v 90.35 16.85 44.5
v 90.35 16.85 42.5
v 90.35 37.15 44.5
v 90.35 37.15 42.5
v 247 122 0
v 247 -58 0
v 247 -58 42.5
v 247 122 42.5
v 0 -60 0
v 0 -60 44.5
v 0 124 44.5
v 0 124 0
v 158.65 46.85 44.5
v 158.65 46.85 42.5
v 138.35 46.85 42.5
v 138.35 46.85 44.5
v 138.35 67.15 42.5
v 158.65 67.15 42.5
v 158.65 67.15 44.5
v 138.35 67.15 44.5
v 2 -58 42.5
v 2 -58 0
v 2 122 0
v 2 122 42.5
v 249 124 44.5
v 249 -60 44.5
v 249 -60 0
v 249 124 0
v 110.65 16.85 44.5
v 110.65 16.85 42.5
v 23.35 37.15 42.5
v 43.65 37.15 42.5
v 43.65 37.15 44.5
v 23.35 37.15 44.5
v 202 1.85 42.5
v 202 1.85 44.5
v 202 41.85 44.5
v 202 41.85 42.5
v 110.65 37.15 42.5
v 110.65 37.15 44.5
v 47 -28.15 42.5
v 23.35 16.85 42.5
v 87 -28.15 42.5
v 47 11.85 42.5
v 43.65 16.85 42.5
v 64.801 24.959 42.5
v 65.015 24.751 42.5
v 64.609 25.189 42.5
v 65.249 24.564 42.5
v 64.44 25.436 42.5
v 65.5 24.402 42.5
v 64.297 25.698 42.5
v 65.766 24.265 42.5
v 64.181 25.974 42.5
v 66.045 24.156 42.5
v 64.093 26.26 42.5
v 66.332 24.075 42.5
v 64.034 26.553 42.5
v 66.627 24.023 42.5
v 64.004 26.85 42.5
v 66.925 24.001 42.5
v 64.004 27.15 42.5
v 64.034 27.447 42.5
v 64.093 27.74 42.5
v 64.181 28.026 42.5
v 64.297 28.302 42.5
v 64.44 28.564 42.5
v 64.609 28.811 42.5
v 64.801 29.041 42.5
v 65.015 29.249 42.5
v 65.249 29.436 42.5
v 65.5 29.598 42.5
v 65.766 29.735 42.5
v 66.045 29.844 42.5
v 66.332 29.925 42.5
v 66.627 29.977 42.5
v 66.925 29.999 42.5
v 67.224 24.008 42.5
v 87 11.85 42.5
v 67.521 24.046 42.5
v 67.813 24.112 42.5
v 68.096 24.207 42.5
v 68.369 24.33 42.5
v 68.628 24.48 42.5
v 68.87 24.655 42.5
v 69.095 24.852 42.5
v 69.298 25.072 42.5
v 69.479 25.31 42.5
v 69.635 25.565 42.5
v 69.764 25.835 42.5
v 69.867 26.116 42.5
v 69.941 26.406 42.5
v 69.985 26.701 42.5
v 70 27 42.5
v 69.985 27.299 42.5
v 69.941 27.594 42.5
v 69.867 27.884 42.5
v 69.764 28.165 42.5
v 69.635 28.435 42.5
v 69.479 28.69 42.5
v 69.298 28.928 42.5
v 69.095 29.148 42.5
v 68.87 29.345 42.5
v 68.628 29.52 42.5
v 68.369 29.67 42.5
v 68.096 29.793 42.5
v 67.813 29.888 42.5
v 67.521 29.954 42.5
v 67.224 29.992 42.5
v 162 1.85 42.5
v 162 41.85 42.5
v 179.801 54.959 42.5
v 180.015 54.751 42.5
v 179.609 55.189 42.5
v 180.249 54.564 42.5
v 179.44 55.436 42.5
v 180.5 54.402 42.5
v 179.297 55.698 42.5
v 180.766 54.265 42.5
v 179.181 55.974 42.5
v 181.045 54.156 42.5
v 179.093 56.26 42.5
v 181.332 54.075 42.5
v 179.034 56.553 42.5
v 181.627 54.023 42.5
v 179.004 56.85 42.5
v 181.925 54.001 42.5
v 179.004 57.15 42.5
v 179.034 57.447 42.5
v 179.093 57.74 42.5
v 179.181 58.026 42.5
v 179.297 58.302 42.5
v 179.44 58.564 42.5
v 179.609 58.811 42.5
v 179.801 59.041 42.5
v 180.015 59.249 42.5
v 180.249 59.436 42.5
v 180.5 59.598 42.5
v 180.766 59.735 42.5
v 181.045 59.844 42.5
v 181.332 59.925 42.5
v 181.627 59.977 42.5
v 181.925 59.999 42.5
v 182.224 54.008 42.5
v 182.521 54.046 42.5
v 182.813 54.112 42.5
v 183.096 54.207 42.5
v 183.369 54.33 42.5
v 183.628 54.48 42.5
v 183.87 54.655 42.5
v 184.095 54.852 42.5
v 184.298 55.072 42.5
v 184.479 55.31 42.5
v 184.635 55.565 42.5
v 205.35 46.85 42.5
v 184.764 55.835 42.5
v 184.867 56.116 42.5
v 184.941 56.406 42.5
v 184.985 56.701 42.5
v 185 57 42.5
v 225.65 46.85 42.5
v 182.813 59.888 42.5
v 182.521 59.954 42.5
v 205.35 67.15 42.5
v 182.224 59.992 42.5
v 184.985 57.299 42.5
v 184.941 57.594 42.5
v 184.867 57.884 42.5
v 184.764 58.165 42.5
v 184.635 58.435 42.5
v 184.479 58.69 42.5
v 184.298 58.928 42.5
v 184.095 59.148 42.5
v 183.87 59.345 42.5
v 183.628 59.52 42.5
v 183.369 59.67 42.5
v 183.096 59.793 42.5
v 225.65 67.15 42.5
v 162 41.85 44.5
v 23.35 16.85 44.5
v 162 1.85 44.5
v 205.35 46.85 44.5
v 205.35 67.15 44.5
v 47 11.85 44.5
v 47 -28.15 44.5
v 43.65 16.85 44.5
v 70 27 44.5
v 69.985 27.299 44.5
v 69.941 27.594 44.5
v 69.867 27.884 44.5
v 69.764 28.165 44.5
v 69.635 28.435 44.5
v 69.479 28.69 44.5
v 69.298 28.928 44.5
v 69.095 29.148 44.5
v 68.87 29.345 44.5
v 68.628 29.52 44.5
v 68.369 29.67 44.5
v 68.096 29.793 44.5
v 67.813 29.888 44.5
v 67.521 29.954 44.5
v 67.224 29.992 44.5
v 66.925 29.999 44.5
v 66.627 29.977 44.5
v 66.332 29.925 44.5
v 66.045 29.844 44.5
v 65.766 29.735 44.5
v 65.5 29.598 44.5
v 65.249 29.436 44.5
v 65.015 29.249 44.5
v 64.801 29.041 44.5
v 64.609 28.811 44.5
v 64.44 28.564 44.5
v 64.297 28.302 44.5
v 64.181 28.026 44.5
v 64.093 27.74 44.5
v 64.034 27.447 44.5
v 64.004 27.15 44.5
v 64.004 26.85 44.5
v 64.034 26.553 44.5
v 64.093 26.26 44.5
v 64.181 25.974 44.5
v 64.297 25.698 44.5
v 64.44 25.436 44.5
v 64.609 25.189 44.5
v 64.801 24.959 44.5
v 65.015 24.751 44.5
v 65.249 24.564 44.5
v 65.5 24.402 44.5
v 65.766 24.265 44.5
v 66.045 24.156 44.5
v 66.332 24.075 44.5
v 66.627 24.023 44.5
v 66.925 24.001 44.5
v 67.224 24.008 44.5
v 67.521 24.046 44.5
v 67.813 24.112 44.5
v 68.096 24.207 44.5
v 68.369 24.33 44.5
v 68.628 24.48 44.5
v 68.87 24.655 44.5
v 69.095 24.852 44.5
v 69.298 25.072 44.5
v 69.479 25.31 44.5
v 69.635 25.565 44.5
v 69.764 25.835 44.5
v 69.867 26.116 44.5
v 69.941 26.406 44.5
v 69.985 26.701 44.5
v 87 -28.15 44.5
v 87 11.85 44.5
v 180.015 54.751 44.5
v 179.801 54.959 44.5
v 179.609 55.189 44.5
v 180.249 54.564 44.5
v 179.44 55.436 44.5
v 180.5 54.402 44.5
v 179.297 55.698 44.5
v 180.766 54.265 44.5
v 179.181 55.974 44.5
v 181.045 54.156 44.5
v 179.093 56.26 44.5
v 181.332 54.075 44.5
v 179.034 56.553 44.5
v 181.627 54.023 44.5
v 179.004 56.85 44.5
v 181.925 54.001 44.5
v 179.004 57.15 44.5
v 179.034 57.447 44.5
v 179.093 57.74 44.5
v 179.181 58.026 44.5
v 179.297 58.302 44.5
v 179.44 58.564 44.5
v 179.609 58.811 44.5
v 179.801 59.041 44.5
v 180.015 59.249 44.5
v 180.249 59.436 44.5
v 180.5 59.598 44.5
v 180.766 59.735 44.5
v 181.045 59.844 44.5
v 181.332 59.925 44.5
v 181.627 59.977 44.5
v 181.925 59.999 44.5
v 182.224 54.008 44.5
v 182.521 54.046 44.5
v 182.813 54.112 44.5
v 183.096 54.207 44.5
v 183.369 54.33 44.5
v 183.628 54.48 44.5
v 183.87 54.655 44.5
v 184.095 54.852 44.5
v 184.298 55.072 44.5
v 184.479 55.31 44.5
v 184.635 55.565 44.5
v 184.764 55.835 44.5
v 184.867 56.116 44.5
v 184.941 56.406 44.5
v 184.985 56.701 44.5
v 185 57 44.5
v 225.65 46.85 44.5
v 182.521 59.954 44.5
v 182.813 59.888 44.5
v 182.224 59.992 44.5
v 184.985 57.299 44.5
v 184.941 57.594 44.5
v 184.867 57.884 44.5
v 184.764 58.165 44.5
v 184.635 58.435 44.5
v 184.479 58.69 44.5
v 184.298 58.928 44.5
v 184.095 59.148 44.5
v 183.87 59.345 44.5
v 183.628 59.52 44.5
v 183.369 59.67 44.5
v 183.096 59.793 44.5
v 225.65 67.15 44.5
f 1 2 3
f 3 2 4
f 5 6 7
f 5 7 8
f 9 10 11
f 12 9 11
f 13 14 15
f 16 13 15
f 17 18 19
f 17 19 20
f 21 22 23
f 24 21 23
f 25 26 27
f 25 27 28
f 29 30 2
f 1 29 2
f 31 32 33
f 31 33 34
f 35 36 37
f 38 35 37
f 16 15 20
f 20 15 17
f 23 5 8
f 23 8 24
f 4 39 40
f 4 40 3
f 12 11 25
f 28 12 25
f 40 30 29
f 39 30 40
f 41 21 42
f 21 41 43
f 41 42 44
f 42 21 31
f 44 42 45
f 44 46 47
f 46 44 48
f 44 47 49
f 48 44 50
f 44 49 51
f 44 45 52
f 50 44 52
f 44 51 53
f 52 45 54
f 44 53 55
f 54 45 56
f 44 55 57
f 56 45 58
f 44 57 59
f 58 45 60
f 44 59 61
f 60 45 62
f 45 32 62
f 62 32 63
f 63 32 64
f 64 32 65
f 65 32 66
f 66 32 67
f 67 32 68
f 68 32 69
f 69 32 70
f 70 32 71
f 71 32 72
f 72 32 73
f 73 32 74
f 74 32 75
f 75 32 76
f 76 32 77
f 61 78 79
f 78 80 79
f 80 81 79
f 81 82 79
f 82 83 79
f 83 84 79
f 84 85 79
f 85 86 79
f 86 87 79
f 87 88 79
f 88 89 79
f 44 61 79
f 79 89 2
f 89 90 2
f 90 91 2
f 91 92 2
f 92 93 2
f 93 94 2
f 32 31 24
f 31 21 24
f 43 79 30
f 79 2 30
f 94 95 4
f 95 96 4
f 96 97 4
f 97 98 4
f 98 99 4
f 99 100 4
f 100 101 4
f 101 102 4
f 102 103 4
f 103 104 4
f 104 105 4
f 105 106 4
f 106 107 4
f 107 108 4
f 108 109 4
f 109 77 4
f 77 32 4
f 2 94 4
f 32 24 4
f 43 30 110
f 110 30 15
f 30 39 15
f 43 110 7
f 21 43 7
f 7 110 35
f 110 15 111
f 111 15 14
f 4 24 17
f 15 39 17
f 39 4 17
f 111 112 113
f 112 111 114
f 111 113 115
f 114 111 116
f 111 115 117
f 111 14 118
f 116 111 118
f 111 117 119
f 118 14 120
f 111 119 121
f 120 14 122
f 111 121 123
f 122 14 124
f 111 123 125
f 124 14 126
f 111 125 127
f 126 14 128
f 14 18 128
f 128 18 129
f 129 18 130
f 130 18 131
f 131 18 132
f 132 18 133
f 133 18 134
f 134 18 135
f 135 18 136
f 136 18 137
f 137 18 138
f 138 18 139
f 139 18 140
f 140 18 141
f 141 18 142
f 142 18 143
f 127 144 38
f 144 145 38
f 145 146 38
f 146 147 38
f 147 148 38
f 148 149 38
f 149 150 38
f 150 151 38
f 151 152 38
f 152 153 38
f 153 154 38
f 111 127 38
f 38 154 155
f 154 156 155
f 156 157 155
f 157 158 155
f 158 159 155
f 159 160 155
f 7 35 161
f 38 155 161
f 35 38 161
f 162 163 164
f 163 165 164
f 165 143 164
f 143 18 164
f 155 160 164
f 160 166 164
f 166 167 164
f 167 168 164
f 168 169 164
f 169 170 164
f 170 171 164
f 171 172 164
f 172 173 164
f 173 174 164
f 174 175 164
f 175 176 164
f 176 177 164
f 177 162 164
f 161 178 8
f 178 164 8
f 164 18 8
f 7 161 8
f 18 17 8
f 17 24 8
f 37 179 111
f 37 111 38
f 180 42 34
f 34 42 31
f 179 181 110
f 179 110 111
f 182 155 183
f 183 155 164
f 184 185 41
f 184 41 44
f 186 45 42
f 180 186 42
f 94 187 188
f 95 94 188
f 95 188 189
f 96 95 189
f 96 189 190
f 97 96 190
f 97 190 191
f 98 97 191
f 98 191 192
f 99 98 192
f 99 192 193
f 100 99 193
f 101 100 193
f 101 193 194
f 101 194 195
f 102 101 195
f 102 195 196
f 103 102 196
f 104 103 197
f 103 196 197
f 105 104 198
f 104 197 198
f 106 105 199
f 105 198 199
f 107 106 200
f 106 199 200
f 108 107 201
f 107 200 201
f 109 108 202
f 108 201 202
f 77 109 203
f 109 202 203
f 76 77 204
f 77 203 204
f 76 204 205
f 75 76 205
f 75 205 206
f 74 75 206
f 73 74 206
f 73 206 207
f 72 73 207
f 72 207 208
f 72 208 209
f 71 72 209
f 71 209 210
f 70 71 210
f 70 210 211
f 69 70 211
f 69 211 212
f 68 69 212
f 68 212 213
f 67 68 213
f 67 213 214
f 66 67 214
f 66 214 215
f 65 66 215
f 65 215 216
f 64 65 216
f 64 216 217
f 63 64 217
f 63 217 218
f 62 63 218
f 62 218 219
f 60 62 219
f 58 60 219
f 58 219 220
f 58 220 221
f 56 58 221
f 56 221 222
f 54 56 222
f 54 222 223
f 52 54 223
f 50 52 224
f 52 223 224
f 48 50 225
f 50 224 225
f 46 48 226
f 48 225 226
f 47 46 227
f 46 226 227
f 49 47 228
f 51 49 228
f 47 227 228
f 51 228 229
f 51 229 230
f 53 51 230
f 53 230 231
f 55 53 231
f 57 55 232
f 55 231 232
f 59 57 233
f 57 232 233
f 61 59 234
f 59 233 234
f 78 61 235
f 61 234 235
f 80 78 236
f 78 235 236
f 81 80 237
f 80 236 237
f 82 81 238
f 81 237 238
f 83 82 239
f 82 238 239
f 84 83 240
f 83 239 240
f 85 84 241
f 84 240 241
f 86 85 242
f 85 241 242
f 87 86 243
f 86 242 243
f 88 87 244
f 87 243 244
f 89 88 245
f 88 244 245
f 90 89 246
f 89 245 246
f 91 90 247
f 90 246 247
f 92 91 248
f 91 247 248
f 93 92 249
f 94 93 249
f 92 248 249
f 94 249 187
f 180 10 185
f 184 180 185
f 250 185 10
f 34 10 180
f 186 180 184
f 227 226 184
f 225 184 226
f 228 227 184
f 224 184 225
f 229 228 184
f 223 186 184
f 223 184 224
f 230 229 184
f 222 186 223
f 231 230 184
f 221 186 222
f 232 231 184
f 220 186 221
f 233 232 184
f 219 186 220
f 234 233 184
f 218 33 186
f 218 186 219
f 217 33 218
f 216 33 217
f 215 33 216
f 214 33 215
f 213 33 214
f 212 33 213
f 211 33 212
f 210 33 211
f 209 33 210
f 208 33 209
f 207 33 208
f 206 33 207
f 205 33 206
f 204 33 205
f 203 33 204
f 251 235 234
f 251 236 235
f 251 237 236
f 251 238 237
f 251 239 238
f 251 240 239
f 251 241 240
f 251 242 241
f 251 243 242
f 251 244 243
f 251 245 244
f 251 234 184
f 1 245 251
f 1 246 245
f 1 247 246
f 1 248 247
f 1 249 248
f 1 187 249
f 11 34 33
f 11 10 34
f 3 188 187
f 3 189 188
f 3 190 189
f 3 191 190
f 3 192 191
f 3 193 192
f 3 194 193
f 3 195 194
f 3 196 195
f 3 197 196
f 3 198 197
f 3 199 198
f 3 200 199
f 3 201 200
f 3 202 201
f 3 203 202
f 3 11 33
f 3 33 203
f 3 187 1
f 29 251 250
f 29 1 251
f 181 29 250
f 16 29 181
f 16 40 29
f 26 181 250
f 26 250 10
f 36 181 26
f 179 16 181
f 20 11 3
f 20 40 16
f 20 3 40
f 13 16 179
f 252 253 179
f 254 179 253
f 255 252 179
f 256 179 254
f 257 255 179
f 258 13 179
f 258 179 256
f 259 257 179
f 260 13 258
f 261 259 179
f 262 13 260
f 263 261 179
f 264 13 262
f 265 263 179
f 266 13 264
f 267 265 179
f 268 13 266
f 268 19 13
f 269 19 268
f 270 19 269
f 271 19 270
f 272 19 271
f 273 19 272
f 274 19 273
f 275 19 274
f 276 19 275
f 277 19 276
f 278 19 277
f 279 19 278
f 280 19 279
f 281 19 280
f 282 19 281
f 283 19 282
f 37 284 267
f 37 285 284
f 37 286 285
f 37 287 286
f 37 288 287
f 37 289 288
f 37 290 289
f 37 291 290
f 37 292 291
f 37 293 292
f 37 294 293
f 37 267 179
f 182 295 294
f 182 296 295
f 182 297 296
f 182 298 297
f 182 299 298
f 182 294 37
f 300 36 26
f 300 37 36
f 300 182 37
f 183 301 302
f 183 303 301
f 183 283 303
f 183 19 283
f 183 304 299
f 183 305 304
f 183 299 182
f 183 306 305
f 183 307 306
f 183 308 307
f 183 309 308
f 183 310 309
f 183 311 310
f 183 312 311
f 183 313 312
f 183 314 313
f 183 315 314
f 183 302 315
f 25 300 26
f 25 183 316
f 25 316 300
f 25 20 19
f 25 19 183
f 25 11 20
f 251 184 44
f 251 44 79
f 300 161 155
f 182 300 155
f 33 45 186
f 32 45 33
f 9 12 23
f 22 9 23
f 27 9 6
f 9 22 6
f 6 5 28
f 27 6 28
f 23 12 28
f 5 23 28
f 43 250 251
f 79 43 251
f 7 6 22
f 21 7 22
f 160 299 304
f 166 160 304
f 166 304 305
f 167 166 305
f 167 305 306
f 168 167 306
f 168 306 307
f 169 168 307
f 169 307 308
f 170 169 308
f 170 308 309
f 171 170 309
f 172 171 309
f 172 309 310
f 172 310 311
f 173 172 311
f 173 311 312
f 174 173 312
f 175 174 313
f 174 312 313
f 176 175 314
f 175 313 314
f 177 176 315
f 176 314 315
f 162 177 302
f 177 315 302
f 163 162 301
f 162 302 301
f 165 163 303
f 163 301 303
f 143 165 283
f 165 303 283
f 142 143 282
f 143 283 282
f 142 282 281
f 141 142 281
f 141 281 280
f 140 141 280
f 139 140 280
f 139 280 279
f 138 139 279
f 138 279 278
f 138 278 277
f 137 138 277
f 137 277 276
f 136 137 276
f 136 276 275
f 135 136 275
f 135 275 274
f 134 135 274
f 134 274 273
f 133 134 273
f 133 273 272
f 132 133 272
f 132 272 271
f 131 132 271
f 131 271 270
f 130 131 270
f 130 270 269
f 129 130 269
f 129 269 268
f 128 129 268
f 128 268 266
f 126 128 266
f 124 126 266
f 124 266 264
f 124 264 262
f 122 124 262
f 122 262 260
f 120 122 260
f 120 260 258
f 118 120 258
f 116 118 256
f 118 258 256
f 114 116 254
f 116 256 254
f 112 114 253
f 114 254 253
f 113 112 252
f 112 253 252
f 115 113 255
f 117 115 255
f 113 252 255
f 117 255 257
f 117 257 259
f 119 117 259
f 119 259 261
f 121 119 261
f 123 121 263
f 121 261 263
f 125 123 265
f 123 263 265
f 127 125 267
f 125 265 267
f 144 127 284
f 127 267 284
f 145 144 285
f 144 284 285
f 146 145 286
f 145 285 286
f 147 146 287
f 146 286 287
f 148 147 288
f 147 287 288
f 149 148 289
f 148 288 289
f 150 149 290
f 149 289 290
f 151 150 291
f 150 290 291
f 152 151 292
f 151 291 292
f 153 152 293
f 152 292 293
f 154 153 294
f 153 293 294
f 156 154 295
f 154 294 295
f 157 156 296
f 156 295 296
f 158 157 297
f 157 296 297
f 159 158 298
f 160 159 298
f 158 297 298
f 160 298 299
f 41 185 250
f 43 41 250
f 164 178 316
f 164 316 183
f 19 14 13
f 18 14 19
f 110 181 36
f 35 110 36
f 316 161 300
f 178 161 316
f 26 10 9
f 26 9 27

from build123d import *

# Parameters (mm, degrees)
CROQUIS1_W              = 249
CROQUIS1_H              = 84
SALIENTE_EXTRUIR1_DEPTH = 44.5
VACIADO1_T              = -2
CROQUIS2_W              = 20.3
CROQUIS2_H              = 20.3
CORTAR_EXTRUIR1_DEPTH   = 45
CROQUIS4_R              = 3
CORTAR_EXTRUIR2_DEPTH   = 10
CROQUIS5_W              = 249
CROQUIS5_H              = 40
CROQUIS5_H_2            = 60
SALIENTE_EXTRUIR3_DEPTH = 44.5
CROQUIS7_W              = 245
CROQUIS7_H              = 40.5
CORTAR_EXTRUIR3_DEPTH   = 180
CROQUIS8_W              = 245
CROQUIS8_H              = 180
CORTAR_EXTRUIR4_DEPTH   = 42.5
CROQUIS9_W              = 40
CROQUIS9_H              = 40
CORTAR_EXTRUIR5_DEPTH   = 2


with BuildPart() as part:
    # Croquis1 → Saliente-Extruir1 (new body)
    with BuildSketch(Plane.XY):
        with Locations((124.5, 42)):
            Rectangle(CROQUIS1_W, CROQUIS1_H)
    extrude(amount=SALIENTE_EXTRUIR1_DEPTH)

    # Vaciado1
    vaciado1_openings = [part.faces().sort_by_distance(p)[0] for p in [
        (124.5, 42, 0),
    ]]
    offset(amount=VACIADO1_T, openings=vaciado1_openings, kind=Kind.INTERSECTION)

    # Croquis2 → Cortar-Extruir1 (cut)
    with BuildSketch(Plane(origin=(0, 0, 42.5), x_dir=(-1, 0, 0), z_dir=(0, 0, -1))):
        with Locations((-100.5, 27)):
            Rectangle(CROQUIS2_W, CROQUIS2_H)
        with Locations((-33.5, 27)):
            Rectangle(CROQUIS2_W, CROQUIS2_H)
        with Locations((-215.5, 57)):
            Rectangle(CROQUIS2_W, CROQUIS2_H)
        with Locations((-148.5, 57)):
            Rectangle(CROQUIS2_W, CROQUIS2_H)
    extrude(amount=-CORTAR_EXTRUIR1_DEPTH, mode=Mode.SUBTRACT)

    # Croquis4 → Cortar-Extruir2 (cut)
    with BuildSketch(Plane.XY.offset(44.5)):
        with Locations((67, 27)):
            Circle(CROQUIS4_R)
        with Locations((182, 57)):
            Circle(CROQUIS4_R)
    extrude(amount=-CORTAR_EXTRUIR2_DEPTH, mode=Mode.SUBTRACT)

    # Croquis5 → Saliente-Extruir3 (add)
    with BuildSketch(Plane.XY.offset(44.5)):
        with Locations((124.5, 104)):
            Rectangle(CROQUIS5_W, CROQUIS5_H)
        with Locations((124.5, -30)):
            Rectangle(CROQUIS5_W, CROQUIS5_H_2)
    extrude(amount=-SALIENTE_EXTRUIR3_DEPTH)

    # Croquis7 → Cortar-Extruir3 (cut)
    with BuildSketch(Plane(origin=(0, -58, 0), x_dir=(-1, 0, 0), z_dir=(0, -1, 0))):
        with Locations((-124.5, -22.25)):
            Rectangle(CROQUIS7_W, CROQUIS7_H)
    extrude(amount=-CORTAR_EXTRUIR3_DEPTH, mode=Mode.SUBTRACT)

    # Croquis8 → Cortar-Extruir4 (cut)
    with BuildSketch(Plane(origin=(0, 0, 0), x_dir=(-1, 0, 0), z_dir=(0, 0, -1))):
        with Locations((-124.5, 32)):
            Rectangle(CROQUIS8_W, CROQUIS8_H)
    extrude(amount=-CORTAR_EXTRUIR4_DEPTH, mode=Mode.SUBTRACT)

    # Croquis9 → Cortar-Extruir5 (cut)
    with BuildSketch(Plane.XY.offset(44.5)):
        with Locations((67, -8.15)):
            Rectangle(CROQUIS9_W, CROQUIS9_H)
        with Locations((182, 21.85)):
            Rectangle(CROQUIS9_W, CROQUIS9_H)
    extrude(amount=-CORTAR_EXTRUIR5_DEPTH, mode=Mode.SUBTRACT)


solid = part.part
